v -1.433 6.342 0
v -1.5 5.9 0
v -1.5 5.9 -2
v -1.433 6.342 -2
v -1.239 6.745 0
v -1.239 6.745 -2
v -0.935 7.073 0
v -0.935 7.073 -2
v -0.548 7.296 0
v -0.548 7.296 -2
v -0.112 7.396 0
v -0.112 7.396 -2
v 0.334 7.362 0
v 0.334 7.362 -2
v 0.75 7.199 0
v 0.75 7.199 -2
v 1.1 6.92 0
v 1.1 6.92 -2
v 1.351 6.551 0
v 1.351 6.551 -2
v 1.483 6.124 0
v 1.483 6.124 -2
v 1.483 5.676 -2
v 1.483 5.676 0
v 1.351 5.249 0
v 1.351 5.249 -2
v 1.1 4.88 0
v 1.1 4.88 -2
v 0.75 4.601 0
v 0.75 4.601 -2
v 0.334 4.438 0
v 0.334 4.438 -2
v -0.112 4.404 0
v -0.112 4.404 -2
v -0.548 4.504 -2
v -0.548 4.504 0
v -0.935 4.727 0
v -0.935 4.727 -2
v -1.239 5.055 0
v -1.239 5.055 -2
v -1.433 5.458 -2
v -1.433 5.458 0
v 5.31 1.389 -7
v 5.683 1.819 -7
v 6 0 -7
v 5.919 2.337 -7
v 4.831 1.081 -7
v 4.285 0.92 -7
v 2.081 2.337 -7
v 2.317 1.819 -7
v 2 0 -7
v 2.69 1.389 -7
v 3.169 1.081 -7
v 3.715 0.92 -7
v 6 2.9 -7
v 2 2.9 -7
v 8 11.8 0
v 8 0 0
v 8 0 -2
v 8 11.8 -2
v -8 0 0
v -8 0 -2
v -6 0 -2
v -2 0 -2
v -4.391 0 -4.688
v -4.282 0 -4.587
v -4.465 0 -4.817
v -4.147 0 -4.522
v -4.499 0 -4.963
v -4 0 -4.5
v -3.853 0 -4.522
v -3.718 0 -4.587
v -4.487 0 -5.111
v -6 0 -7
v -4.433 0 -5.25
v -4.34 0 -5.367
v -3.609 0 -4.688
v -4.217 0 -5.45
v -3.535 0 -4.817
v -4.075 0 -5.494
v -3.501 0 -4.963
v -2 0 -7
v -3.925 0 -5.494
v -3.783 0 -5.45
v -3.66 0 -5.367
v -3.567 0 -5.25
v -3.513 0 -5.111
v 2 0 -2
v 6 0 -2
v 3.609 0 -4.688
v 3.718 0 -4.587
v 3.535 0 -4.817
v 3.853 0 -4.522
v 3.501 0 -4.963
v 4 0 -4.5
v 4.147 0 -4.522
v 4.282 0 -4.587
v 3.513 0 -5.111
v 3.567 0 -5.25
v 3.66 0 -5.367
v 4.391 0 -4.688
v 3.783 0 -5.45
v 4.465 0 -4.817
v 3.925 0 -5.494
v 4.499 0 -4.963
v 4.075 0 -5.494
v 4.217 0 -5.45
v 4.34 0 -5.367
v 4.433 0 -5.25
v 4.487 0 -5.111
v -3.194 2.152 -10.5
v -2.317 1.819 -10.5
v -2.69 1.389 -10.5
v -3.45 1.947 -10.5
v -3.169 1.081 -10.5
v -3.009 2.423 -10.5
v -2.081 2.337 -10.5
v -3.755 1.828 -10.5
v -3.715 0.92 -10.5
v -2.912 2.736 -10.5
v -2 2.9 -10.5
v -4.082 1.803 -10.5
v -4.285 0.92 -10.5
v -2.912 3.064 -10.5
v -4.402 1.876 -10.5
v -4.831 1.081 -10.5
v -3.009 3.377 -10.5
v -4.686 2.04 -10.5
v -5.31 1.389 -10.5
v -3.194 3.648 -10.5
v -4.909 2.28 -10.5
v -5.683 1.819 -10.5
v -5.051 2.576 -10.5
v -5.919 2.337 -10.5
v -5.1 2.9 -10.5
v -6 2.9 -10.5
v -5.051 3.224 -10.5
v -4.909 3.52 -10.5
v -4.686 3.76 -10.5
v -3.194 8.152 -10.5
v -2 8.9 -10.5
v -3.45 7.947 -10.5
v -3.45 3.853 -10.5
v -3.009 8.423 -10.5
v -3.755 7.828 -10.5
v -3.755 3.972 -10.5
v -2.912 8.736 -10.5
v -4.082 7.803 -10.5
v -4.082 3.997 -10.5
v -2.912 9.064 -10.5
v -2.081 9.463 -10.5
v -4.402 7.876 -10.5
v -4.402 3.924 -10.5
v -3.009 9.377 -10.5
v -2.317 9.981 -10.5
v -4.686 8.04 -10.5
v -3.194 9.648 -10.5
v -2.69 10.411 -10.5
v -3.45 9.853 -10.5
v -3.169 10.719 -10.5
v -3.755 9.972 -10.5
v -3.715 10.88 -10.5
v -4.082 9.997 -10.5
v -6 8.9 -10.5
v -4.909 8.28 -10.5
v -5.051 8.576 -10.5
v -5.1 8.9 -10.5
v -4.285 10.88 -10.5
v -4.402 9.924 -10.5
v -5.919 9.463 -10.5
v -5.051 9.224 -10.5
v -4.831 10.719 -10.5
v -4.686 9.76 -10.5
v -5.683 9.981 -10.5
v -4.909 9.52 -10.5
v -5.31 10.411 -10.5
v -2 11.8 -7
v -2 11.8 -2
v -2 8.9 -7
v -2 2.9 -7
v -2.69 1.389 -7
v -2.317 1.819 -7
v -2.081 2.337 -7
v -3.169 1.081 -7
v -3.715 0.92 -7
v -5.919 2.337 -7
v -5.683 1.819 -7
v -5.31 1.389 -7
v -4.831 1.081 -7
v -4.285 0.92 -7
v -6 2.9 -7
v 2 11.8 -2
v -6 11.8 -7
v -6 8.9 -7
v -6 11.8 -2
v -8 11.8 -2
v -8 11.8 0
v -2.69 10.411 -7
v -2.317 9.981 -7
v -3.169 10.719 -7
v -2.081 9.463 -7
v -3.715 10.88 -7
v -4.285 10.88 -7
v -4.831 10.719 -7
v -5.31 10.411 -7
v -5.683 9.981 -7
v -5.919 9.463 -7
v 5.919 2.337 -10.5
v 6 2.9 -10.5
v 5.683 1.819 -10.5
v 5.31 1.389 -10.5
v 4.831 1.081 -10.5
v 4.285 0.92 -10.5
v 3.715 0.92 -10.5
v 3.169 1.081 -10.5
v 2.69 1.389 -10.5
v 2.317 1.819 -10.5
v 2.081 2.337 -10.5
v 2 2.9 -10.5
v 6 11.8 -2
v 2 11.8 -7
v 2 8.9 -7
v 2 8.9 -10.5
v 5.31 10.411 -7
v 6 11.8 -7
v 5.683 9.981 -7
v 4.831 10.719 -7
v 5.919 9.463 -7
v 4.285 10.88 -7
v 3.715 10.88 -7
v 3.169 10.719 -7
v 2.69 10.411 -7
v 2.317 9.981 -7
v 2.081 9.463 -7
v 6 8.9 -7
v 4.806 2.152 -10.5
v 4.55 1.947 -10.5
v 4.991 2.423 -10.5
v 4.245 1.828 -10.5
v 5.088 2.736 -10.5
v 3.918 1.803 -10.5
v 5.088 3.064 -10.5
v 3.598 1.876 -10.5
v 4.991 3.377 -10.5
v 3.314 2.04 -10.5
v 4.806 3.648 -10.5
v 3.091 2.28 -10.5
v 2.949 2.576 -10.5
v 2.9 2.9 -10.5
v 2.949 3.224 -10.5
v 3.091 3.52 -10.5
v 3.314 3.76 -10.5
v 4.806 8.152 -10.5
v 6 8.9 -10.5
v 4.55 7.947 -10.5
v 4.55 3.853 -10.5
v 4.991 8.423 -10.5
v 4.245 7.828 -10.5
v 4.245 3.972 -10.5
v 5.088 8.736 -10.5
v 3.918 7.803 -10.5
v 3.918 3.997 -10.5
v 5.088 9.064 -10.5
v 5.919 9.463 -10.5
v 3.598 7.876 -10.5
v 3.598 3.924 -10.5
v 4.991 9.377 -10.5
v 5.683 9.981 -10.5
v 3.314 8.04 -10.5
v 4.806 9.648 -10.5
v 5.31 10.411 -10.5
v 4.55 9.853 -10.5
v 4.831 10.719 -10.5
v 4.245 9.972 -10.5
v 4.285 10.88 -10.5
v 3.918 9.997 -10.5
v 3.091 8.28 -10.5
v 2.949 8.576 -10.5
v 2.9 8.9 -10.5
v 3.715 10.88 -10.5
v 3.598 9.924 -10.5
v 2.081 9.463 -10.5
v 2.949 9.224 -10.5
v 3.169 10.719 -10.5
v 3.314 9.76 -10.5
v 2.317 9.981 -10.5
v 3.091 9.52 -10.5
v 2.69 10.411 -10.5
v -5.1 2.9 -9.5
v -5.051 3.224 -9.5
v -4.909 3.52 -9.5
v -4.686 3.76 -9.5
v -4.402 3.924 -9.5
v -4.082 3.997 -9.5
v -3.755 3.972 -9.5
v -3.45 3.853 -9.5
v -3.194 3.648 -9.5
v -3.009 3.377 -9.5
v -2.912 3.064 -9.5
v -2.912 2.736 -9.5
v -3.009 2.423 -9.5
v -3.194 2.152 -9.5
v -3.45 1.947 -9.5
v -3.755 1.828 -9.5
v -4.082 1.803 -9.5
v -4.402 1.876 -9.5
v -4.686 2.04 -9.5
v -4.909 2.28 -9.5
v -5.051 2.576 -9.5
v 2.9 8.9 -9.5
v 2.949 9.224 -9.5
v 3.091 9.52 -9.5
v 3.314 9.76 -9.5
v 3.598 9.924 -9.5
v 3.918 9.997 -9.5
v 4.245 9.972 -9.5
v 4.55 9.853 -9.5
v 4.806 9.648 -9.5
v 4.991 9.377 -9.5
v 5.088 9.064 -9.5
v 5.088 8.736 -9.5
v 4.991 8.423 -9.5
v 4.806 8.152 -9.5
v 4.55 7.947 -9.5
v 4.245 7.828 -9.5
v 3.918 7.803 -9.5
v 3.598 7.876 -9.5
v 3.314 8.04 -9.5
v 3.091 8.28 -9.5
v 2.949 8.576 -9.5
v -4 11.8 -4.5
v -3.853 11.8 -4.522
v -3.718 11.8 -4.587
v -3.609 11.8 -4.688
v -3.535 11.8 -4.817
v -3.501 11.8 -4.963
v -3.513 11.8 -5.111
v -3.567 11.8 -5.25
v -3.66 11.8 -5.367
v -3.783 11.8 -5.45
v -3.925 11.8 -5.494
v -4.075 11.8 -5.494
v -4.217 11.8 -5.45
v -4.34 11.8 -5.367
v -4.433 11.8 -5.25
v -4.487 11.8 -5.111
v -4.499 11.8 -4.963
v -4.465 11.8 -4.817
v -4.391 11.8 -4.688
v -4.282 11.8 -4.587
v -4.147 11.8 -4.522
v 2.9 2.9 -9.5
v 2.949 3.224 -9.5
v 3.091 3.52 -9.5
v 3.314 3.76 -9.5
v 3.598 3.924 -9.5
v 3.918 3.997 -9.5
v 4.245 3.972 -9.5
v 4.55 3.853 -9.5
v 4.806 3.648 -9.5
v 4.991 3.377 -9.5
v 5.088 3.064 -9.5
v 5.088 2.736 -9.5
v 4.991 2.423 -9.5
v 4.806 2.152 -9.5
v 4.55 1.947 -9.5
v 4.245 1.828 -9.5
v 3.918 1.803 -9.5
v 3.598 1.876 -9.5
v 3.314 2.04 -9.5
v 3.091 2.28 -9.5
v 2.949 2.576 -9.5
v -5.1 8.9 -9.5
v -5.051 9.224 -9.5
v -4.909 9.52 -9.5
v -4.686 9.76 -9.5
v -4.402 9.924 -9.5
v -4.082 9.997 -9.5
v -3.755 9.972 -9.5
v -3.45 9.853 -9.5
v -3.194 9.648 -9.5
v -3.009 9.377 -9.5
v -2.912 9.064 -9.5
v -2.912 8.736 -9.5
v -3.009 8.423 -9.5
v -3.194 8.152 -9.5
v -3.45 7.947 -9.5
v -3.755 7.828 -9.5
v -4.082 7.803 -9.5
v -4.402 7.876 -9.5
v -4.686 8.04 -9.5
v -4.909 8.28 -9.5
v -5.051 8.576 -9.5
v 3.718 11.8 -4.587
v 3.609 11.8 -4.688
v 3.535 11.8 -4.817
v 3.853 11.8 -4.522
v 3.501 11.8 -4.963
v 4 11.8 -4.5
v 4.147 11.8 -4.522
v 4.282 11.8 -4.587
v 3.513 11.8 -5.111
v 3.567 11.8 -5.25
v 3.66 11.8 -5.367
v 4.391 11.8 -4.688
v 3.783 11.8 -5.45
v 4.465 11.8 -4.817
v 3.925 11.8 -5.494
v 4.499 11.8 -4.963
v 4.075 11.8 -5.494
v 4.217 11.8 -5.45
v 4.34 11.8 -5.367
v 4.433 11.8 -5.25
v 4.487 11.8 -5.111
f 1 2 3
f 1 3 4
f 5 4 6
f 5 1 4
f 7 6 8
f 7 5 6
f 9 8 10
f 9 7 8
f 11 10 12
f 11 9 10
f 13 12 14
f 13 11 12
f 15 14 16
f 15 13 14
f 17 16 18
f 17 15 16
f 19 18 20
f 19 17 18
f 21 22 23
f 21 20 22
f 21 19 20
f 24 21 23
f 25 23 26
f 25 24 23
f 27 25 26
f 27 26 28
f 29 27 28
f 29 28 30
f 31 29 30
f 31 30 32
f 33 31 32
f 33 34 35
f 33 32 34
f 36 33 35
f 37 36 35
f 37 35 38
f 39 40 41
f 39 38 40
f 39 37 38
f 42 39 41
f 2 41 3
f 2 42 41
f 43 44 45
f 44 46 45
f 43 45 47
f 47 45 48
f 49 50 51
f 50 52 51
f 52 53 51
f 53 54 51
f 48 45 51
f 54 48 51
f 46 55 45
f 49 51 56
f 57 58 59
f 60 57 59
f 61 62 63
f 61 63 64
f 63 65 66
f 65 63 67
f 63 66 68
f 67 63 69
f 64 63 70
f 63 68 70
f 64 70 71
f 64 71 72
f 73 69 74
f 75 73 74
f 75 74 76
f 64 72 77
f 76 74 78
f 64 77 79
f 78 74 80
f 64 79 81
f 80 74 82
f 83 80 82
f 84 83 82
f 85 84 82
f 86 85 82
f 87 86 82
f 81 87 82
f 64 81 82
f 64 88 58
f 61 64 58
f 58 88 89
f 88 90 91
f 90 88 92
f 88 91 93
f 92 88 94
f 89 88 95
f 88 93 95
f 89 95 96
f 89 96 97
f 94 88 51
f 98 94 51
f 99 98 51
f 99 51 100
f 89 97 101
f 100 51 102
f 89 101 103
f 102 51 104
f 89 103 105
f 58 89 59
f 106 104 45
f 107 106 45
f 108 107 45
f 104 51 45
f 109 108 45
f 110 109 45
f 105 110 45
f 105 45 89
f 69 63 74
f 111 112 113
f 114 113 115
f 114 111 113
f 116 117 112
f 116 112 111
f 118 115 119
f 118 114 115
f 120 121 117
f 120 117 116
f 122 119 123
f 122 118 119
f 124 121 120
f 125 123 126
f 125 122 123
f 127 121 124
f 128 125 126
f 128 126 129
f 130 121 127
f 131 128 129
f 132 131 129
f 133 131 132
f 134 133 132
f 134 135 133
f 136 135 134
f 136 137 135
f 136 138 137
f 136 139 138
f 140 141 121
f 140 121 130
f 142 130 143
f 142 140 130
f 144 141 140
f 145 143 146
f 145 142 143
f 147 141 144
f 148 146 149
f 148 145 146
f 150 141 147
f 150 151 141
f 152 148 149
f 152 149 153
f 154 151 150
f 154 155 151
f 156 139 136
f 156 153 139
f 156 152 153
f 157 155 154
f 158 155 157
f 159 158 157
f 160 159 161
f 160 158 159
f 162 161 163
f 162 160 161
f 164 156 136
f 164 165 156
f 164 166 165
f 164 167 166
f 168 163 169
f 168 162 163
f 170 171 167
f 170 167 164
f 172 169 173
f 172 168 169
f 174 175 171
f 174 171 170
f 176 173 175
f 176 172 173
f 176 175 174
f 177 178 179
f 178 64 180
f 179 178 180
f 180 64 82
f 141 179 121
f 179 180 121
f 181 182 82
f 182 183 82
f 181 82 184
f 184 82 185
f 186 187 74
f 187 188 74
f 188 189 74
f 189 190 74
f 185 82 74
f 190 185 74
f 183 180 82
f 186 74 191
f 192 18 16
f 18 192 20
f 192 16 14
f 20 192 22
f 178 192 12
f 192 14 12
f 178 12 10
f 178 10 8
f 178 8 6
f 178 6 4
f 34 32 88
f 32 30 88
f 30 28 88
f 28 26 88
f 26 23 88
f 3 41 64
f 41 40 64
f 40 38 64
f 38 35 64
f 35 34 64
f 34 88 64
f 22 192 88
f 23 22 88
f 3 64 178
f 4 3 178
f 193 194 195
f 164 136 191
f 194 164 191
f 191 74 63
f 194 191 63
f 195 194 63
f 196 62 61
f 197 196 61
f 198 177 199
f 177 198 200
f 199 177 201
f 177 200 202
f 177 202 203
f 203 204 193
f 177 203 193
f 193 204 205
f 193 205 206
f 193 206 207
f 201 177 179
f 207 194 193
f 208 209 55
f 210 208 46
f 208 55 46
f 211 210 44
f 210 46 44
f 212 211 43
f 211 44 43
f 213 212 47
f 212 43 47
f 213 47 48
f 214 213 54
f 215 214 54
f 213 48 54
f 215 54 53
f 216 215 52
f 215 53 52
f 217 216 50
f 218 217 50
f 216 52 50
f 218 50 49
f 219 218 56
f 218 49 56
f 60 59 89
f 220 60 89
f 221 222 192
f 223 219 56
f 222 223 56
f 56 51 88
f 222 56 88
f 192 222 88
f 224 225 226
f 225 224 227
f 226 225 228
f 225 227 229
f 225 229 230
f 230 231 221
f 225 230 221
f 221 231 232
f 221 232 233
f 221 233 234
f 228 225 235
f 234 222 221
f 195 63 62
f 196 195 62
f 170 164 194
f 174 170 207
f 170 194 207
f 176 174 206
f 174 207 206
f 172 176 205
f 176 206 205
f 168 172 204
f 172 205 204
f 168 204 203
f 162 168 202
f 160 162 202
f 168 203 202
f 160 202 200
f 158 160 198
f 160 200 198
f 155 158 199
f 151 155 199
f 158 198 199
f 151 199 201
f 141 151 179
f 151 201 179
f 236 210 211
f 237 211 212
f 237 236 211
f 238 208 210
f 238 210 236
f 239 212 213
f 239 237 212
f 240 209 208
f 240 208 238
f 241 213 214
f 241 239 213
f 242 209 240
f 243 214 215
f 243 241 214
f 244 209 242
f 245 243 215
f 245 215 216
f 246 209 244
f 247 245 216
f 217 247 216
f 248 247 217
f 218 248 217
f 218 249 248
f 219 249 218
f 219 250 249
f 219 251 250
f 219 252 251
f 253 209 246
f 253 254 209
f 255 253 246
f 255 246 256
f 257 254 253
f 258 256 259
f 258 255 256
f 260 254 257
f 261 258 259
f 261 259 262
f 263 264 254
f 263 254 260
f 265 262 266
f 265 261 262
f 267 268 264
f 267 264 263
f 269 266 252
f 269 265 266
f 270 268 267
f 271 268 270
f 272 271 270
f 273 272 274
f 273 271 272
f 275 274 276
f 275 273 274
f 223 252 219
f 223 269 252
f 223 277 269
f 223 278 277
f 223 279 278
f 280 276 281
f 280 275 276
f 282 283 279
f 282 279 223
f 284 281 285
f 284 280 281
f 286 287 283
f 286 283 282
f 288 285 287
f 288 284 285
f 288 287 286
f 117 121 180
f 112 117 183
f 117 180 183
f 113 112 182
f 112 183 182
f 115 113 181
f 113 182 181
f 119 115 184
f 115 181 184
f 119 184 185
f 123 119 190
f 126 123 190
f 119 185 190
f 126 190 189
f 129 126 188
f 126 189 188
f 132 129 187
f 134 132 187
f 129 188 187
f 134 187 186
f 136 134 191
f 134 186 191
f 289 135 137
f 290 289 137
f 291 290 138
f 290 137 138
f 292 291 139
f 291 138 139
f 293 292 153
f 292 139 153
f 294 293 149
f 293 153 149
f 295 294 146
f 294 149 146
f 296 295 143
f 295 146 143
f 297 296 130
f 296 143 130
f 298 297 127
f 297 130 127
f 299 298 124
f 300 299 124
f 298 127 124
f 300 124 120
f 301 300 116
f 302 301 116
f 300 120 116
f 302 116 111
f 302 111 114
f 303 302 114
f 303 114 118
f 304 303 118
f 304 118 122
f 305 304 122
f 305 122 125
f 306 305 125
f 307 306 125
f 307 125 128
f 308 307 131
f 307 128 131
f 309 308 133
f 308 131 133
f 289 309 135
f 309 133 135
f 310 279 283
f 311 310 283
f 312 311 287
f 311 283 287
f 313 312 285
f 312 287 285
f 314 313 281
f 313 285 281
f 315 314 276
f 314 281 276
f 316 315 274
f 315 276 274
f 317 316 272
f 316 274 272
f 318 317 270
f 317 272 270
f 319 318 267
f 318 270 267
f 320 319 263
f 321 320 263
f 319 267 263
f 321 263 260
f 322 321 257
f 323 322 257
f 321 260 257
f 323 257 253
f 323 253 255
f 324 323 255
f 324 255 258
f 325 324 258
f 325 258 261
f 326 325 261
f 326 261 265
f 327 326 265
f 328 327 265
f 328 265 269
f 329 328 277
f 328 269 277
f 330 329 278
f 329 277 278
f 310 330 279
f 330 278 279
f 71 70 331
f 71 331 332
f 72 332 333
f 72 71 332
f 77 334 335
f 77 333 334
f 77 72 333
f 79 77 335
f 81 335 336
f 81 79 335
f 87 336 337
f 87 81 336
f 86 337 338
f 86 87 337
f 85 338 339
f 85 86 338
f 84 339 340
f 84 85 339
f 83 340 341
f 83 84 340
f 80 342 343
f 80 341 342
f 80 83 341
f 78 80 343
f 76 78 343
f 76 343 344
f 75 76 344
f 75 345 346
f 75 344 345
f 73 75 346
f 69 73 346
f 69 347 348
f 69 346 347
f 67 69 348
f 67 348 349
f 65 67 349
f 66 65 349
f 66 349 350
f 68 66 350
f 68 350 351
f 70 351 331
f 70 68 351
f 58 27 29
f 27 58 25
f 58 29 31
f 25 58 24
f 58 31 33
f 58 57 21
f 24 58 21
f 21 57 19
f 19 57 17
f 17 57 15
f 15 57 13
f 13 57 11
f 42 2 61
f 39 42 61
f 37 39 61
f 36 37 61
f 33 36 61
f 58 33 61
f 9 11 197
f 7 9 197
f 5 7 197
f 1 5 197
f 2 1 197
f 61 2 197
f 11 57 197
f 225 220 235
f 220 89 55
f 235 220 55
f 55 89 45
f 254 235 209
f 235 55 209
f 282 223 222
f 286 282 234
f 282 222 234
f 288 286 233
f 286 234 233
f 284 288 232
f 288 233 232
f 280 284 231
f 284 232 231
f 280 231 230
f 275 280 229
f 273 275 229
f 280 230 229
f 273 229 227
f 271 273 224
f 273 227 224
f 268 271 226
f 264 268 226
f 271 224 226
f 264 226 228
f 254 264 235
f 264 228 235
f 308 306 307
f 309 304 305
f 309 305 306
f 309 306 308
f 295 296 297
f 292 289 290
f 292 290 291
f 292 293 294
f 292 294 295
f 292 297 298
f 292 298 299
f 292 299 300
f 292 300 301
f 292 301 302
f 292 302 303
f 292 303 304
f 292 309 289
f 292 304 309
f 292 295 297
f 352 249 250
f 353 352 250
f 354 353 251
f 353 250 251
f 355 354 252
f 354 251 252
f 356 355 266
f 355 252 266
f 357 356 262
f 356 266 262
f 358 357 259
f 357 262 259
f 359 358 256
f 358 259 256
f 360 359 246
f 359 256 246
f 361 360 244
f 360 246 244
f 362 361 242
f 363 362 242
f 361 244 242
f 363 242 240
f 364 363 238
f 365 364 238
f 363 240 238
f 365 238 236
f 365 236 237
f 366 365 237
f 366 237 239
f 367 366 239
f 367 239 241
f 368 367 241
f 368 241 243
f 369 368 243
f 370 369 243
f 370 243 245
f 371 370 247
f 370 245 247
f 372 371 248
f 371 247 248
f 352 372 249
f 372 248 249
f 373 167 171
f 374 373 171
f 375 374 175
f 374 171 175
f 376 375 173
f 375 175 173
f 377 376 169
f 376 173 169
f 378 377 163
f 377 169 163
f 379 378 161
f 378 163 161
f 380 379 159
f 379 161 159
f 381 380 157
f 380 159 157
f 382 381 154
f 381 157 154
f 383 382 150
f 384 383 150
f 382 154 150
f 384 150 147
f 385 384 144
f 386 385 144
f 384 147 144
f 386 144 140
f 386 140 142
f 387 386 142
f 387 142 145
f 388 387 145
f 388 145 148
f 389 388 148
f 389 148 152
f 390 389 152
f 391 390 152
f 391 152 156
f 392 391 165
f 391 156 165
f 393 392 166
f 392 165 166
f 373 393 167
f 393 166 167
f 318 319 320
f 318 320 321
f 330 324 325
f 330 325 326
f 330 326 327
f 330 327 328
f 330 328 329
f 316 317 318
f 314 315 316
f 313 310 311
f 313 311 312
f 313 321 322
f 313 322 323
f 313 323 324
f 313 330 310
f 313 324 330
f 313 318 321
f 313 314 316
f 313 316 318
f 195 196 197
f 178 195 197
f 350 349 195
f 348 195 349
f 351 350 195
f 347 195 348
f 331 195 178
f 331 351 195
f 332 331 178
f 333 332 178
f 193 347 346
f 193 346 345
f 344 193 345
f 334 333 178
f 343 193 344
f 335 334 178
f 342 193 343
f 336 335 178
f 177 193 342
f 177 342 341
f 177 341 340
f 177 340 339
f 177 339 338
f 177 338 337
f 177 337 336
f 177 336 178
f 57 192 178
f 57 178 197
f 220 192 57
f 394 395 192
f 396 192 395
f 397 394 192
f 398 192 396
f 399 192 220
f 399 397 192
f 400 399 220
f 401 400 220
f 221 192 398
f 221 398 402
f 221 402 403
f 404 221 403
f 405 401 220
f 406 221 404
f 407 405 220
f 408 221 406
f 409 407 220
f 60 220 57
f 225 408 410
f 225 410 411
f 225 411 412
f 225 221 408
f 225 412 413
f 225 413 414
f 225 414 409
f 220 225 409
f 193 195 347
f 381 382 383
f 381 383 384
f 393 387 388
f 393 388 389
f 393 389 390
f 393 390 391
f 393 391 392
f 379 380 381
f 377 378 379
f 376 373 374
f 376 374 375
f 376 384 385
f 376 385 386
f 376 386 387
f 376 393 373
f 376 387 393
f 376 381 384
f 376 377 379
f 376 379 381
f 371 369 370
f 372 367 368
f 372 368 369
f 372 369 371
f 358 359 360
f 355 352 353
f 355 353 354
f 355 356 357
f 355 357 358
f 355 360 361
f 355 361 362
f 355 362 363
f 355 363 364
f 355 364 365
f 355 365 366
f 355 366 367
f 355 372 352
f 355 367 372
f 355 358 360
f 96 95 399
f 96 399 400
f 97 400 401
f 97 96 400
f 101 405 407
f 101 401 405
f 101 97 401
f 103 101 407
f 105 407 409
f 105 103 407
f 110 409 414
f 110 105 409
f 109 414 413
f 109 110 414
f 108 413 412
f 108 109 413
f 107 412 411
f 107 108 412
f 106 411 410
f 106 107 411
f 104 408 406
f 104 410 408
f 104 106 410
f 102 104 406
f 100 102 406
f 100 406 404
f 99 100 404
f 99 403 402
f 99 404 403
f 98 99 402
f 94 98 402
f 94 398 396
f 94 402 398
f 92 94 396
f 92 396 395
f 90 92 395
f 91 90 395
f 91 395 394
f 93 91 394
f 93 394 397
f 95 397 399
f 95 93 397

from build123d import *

# Parameters (mm, degrees)
BOSS_EXTRUDE1_DEPTH     = 11.8
BOSS_EXTRUDE2_DEPTH     = 10.5
CUT_EXTRUDE1_DEPTH      = 18.705648816
CUT_EXTRUDE1_DEPTH_BACK = 18.705648816
SKETCH2_R               = 0.5
SKETCH5_R               = 1.1
CUT_EXTRUDE2_DEPTH      = 1
CUT_EXTRUDE3_DEPTH      = 17.597891432
CUT_EXTRUDE3_DEPTH_BACK = 17.597891432
SKETCH6_R               = 1.5


with BuildPart() as part:
    # Sketch1 → Boss-Extrude1 (new body)
    with BuildSketch(Plane(origin=(0, 0, 0), x_dir=(1, 0, 0), z_dir=(0, 1, 0))):
        Polygon((0, 0), (8, 0), (8, 2), (6, 2), (6, 7), (2, 7), (2, 2), (-2, 2), (-2, 7), (-6, 7), (-6, 2), (-8, 2), (-8, 0), align=None)
    extrude(amount=BOSS_EXTRUDE1_DEPTH)

    # Sketch4 → Boss-Extrude2 (add)
    with BuildSketch(Plane.XY):
        with BuildLine():
            Line((-2, 8.9), (-2, 2.9))
            ThreePointArc((-2, 2.9), (-4, 0.9), (-6, 2.9))
            Line((-6, 2.9), (-6, 8.9))
            ThreePointArc((-6, 8.9), (-4, 10.9), (-2, 8.9))
        make_face()
        with BuildLine():
            Line((6, 8.9), (6, 2.9))
            ThreePointArc((6, 2.9), (4, 0.9), (2, 2.9))
            Line((2, 2.9), (2, 8.9))
            ThreePointArc((2, 8.9), (4, 10.9), (6, 8.9))
        make_face()
    extrude(amount=-BOSS_EXTRUDE2_DEPTH)

    # Sketch2 → Cut-Extrude1 (cut, two sides: drawn at the far end of the back side and taken through both)
    with BuildSketch(Plane(origin=(0, 11.8, 0), x_dir=(1, 0, 0), z_dir=(0, 1, 0)).offset(-CUT_EXTRUDE1_DEPTH_BACK)):
        with Locations(Location((-4, 5, 0), (0, 0, 270))):
            Circle(SKETCH2_R)
        with Locations(Location((4, 5, 0), (0, 0, 270))):
            Circle(SKETCH2_R)
    extrude(amount=CUT_EXTRUDE1_DEPTH + CUT_EXTRUDE1_DEPTH_BACK, mode=Mode.SUBTRACT)

    # Sketch5 → Cut-Extrude2 (cut)
    with BuildSketch(Plane(origin=(0, 0, -10.5), x_dir=(-1, 0, 0), z_dir=(0, 0, -1))):
        with Locations((4, 8.9)):
            Circle(SKETCH5_R)
        with Locations((4, 2.9)):
            Circle(SKETCH5_R)
        with Locations((-4, 2.9)):
            Circle(SKETCH5_R)
        with Locations((-4, 8.9)):
            Circle(SKETCH5_R)
    extrude(amount=-CUT_EXTRUDE2_DEPTH, mode=Mode.SUBTRACT)

    # Sketch6 → Cut-Extrude3 (cut, two sides: drawn at the far end of the back side and taken through both)
    with BuildSketch(Plane(origin=(0, 0, -2), x_dir=(-1, 0, 0), z_dir=(0, 0, -1)).offset(-CUT_EXTRUDE3_DEPTH_BACK)):
        with Locations((0, 5.9)):
            Circle(SKETCH6_R)
    extrude(amount=CUT_EXTRUDE3_DEPTH + CUT_EXTRUDE3_DEPTH_BACK, mode=Mode.SUBTRACT)


solid = part.part
